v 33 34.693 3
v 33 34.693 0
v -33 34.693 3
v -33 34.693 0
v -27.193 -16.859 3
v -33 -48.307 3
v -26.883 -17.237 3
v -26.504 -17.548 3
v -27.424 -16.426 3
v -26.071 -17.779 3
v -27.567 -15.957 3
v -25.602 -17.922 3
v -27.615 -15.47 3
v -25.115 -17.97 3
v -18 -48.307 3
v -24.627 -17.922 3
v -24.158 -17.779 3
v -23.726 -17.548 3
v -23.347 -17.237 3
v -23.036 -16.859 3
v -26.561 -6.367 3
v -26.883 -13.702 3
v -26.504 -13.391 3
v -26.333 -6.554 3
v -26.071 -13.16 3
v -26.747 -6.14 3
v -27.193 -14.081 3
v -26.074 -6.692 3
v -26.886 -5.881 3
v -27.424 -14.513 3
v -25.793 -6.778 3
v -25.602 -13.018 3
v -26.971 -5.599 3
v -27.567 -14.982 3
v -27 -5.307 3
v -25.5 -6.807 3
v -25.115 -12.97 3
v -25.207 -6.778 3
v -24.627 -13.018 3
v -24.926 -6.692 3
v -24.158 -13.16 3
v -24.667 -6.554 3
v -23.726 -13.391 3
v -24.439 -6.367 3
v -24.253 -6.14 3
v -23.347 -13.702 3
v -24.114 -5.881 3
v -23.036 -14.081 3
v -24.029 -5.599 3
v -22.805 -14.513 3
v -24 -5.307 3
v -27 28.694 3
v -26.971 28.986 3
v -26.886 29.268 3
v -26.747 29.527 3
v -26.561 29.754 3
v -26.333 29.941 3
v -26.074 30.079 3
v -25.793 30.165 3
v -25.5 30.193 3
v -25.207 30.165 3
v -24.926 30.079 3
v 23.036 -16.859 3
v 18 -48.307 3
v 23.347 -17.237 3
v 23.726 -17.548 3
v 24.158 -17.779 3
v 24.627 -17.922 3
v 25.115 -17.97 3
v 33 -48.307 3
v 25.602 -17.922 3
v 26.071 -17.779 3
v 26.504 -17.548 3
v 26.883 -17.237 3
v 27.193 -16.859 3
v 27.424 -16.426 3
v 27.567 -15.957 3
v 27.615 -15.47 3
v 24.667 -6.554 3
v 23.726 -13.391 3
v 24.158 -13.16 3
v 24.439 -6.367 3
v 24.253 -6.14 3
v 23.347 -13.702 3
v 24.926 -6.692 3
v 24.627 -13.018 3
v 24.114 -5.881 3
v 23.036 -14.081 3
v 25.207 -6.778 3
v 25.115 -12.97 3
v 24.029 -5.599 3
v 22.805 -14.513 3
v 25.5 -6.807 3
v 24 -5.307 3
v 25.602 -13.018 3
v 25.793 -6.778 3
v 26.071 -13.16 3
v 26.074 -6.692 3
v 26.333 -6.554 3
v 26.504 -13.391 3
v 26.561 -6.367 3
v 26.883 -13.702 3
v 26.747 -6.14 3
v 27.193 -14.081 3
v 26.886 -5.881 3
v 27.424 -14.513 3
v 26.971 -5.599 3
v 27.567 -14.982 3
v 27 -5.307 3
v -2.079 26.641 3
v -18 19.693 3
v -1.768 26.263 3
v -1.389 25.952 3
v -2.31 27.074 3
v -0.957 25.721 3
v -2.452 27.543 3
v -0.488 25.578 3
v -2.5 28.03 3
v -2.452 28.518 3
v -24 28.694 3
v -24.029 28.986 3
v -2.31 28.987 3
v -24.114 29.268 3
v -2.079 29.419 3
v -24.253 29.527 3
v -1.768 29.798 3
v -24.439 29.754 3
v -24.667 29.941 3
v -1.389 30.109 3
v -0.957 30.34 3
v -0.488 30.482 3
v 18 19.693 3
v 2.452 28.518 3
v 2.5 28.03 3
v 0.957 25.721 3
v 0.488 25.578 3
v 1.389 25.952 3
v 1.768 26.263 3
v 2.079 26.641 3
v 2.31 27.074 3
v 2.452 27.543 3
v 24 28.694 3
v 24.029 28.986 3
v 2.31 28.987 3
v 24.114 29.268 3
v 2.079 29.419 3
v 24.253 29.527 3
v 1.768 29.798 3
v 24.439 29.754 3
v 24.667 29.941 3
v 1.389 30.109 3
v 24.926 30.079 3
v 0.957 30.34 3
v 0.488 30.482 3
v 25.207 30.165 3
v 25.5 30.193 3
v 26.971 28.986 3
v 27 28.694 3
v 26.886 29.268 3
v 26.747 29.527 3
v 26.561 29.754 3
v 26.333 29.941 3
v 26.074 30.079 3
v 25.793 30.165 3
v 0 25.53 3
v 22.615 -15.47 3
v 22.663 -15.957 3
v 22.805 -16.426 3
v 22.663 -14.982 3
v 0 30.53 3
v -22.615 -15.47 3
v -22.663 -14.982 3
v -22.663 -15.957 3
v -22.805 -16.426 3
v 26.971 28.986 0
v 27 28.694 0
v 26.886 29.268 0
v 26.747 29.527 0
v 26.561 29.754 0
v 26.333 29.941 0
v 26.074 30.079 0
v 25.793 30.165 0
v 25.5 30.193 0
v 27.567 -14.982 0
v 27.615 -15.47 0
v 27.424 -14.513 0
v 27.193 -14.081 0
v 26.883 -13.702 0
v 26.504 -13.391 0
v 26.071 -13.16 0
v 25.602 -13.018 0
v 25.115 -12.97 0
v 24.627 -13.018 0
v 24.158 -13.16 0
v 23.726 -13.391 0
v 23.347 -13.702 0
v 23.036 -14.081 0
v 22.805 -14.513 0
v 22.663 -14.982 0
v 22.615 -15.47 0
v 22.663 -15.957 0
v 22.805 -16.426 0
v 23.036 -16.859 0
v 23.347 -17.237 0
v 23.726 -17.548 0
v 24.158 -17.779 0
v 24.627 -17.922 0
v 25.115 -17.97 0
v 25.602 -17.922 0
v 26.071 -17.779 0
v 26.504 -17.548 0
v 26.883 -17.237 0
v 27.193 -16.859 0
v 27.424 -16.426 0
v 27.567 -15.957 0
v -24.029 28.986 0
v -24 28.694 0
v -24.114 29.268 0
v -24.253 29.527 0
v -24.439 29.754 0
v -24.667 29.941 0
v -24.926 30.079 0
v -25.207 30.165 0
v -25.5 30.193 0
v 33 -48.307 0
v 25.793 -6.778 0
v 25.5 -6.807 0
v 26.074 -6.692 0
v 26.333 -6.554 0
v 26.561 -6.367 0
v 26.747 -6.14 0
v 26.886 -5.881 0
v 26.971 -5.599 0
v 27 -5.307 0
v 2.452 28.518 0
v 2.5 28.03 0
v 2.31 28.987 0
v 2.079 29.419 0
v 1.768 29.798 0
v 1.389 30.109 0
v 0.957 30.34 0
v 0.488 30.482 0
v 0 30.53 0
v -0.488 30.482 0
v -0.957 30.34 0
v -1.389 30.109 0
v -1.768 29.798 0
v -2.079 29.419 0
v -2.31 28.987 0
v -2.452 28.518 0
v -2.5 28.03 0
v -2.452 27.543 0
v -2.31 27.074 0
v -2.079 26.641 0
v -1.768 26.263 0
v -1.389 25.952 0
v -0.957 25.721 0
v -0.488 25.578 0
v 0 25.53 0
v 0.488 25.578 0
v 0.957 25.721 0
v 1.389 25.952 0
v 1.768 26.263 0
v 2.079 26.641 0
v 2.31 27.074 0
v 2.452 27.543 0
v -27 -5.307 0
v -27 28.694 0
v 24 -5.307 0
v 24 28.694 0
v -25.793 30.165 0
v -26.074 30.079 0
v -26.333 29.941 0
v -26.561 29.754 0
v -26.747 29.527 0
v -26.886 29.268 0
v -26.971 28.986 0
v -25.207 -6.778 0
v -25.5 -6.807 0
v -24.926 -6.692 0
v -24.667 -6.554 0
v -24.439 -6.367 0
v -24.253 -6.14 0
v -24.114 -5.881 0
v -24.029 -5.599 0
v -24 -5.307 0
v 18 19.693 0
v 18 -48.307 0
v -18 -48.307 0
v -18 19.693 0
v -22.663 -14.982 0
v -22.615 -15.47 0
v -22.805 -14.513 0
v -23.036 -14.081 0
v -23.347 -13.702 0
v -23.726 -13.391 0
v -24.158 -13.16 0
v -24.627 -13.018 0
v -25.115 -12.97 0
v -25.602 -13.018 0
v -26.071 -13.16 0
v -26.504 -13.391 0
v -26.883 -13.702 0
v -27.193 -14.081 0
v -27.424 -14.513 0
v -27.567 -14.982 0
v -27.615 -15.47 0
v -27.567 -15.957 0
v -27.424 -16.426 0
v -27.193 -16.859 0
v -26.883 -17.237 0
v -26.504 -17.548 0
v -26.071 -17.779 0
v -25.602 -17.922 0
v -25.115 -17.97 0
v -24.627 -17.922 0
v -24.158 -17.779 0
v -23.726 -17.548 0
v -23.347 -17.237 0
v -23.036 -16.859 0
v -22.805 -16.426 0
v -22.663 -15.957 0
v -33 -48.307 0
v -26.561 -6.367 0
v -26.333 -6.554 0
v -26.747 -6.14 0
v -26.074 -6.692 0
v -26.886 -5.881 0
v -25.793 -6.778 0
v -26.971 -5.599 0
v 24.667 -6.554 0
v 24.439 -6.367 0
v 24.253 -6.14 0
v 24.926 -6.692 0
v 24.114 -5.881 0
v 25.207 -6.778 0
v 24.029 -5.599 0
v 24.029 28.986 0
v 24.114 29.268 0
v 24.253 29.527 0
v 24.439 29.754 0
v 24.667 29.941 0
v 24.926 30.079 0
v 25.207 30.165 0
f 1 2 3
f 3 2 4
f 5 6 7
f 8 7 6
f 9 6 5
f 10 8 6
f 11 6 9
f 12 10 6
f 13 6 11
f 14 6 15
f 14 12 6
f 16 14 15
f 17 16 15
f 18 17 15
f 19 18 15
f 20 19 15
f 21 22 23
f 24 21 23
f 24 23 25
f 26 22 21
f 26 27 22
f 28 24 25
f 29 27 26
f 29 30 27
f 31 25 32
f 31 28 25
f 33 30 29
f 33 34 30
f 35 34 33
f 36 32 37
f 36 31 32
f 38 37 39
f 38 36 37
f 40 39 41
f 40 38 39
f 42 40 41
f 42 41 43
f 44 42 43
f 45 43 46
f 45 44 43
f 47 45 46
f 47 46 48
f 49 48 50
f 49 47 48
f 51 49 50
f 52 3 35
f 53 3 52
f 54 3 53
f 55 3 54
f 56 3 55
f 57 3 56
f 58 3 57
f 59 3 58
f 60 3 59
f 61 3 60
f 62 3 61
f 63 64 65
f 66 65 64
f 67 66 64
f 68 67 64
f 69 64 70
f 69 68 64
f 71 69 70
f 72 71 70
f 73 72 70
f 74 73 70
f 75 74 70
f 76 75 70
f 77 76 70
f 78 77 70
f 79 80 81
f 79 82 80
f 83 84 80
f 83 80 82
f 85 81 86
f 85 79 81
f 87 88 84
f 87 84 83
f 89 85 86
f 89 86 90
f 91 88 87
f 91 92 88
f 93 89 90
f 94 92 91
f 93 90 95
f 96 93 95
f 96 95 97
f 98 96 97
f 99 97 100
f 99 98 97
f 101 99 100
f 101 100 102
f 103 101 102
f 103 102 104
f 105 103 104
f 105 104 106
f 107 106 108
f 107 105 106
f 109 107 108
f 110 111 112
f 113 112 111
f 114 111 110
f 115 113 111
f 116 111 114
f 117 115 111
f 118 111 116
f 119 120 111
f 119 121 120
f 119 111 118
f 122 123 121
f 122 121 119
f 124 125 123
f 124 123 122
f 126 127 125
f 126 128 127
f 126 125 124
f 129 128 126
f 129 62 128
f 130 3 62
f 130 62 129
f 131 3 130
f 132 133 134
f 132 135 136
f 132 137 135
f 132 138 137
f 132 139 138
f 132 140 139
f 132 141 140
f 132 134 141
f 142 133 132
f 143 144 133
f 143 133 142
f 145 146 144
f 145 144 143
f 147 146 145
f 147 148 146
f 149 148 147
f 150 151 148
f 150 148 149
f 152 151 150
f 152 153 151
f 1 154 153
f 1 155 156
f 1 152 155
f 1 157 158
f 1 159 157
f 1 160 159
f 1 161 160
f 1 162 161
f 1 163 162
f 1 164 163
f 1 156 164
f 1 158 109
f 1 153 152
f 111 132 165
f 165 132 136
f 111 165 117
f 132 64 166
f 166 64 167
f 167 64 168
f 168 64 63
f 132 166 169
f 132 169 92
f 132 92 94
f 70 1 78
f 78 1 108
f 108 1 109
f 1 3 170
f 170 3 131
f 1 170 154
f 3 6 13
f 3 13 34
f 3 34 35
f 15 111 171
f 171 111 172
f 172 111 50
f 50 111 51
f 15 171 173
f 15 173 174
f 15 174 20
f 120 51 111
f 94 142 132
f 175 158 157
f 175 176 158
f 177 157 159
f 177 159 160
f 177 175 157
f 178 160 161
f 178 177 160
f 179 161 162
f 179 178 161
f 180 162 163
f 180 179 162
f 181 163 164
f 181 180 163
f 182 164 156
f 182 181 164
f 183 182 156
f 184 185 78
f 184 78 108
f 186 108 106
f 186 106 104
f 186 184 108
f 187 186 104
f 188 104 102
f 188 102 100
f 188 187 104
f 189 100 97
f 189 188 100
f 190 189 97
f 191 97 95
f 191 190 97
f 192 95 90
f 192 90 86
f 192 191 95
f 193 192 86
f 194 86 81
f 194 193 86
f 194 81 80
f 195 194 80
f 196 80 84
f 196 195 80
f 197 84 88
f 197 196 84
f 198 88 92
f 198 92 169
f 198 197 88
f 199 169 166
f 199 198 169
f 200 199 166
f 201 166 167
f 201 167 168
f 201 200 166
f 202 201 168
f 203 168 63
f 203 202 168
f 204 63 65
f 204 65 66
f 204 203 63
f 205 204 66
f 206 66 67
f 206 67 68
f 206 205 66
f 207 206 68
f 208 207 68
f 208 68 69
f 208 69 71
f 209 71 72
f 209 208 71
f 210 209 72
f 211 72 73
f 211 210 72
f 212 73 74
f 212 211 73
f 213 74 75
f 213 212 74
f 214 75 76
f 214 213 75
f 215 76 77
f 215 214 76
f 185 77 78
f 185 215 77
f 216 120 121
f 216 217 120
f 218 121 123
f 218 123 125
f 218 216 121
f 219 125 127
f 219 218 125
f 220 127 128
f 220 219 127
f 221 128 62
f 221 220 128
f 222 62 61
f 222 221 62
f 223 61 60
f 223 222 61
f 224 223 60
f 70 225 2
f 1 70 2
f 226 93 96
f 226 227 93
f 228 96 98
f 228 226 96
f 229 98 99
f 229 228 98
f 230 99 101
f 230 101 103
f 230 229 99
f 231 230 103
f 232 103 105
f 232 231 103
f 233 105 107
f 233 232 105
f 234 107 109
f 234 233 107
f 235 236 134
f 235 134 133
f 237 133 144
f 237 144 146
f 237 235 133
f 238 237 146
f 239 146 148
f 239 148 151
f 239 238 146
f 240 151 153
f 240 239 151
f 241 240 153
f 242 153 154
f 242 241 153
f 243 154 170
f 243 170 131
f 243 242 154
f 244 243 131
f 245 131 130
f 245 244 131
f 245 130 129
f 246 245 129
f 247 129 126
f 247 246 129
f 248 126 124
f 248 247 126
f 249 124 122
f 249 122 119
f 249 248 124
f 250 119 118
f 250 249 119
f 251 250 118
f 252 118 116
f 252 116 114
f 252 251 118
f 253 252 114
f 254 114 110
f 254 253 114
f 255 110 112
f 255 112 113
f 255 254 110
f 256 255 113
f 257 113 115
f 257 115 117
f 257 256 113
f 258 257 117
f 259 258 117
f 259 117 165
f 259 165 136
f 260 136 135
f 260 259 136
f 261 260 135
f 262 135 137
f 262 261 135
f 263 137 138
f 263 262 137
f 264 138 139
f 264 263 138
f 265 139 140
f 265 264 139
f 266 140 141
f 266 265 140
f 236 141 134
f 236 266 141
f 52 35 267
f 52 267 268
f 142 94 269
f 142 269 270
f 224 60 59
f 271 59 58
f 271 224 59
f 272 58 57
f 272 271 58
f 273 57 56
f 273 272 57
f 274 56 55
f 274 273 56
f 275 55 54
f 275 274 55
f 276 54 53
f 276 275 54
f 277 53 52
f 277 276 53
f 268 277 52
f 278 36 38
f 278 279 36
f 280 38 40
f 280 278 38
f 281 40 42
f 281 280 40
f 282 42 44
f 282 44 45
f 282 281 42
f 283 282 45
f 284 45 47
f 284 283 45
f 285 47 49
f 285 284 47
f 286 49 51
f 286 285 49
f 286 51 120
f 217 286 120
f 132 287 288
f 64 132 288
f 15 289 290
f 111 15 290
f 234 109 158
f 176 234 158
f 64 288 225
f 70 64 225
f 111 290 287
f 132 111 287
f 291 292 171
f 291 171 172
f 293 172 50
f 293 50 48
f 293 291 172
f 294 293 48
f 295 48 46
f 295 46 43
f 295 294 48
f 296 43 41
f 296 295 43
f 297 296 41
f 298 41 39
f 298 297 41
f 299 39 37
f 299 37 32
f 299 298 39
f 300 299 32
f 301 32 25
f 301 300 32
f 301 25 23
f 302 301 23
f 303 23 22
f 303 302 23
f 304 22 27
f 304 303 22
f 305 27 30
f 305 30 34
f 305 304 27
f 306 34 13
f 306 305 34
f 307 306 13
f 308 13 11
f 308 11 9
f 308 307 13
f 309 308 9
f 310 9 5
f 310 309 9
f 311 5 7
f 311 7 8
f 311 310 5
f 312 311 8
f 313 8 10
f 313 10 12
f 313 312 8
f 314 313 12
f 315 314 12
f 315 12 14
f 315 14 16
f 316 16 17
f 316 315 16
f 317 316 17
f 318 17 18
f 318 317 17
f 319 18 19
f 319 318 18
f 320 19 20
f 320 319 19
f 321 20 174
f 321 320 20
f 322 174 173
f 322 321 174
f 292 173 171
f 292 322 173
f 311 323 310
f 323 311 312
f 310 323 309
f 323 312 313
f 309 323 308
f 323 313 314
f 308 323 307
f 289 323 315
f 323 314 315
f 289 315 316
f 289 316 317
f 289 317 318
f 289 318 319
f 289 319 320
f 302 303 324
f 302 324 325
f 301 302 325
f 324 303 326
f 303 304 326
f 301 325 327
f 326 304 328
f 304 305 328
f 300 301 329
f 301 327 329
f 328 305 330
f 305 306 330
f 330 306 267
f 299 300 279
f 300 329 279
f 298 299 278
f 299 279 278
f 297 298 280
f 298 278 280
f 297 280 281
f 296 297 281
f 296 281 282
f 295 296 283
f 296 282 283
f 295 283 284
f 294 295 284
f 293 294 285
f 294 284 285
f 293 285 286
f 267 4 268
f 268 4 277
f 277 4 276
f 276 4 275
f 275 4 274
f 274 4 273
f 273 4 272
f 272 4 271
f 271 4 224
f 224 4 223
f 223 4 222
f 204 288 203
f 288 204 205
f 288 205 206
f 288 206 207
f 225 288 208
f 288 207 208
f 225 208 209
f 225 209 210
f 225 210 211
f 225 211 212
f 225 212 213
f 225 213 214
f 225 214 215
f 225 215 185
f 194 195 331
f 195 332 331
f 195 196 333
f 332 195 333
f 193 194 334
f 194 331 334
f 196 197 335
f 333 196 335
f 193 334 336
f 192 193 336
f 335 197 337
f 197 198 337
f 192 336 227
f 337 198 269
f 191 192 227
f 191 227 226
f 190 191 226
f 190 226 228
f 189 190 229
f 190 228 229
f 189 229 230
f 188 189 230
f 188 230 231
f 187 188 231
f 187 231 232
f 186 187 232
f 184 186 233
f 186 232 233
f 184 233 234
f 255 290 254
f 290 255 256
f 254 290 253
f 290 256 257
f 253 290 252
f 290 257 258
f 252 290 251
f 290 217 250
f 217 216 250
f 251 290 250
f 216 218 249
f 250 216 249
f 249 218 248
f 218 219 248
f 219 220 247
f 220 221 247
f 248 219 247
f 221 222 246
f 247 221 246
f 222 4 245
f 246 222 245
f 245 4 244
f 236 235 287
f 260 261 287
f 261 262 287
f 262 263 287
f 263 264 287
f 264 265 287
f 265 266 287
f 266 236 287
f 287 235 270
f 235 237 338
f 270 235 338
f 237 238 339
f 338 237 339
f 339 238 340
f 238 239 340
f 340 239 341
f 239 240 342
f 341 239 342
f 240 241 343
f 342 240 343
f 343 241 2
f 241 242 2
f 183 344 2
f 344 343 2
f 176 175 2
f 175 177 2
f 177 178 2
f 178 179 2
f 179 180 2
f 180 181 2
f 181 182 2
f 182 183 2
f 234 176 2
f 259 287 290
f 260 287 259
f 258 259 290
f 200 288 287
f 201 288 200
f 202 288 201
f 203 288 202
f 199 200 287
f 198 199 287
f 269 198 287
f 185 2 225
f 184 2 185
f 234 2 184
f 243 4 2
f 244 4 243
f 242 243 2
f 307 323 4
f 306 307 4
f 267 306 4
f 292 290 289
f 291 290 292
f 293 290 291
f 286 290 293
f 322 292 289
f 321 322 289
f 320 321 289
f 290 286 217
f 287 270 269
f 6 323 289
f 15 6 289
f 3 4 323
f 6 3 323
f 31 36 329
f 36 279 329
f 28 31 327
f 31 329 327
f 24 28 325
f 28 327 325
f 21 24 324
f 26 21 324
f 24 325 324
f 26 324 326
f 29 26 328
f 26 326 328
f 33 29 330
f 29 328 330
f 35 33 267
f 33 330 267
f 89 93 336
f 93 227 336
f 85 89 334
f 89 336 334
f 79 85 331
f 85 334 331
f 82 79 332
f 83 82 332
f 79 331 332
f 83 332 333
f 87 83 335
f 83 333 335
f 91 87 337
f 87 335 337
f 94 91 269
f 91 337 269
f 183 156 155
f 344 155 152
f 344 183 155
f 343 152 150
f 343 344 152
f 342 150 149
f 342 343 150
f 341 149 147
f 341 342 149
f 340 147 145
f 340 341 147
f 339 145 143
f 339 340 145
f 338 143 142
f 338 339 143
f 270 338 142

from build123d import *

# Parameters (mm, degrees)
SKETCH_1_R          = 2.5
EXTRUDE_1_DEPTH     = 3
SKETCH_2_W          = 3
SKETCH_2_H          = 37
CUT_EXTRUDE_1_DEPTH = 59.579181566
FILLET_1_R          = 1.5


with BuildPart() as part:
    # 草图1 → 凸台-拉伸1 (new body)
    with BuildSketch(Plane.XY):
        Polygon((-18, 19.693473392), (18, 19.693473392), (18, -48.306526608), (33, -48.306526608), (33, 34.693473392), (-33, 34.693473392), (-33, -48.306526608), (-18, -48.306526608), align=None)
        with Locations((0, 28.030377616)):
            Circle(SKETCH_1_R, mode=Mode.SUBTRACT)
        with Locations((25.11473671, -15.469622384)):
            Circle(SKETCH_1_R, mode=Mode.SUBTRACT)
        with Locations((-25.11473671, -15.469622384)):
            Circle(SKETCH_1_R, mode=Mode.SUBTRACT)
    extrude(amount=EXTRUDE_1_DEPTH)

    # 草图2 → 切除-拉伸1 (cut, through all)
    with BuildSketch(Plane.XY.offset(3)):
        with Locations((25.5, 11.693473392)):
            Rectangle(SKETCH_2_W, SKETCH_2_H)
        with Locations((-25.5, 11.693473392)):
            Rectangle(SKETCH_2_W, SKETCH_2_H)
    extrude(amount=-CUT_EXTRUDE_1_DEPTH, mode=Mode.SUBTRACT)

    # 圆角1
    fillet_1_edges = [part.edges().sort_by_distance(p)[0] for p in [
        (27, 30.193473392, 1.5),
        (24, 30.193473392, 1.5),
        (24, -6.806526608, 1.5),
        (27, -6.806526608, 1.5),
        (-24, -6.806526608, 1.5),
        (-27, -6.806526608, 1.5),
        (-24, 30.193473392, 1.5),
        (-27, 30.193473392, 1.5),
    ]]
    fillet(fillet_1_edges, radius=FILLET_1_R - 0.0001)  # a hair under: the kernel refuses the full size


solid = part.part
